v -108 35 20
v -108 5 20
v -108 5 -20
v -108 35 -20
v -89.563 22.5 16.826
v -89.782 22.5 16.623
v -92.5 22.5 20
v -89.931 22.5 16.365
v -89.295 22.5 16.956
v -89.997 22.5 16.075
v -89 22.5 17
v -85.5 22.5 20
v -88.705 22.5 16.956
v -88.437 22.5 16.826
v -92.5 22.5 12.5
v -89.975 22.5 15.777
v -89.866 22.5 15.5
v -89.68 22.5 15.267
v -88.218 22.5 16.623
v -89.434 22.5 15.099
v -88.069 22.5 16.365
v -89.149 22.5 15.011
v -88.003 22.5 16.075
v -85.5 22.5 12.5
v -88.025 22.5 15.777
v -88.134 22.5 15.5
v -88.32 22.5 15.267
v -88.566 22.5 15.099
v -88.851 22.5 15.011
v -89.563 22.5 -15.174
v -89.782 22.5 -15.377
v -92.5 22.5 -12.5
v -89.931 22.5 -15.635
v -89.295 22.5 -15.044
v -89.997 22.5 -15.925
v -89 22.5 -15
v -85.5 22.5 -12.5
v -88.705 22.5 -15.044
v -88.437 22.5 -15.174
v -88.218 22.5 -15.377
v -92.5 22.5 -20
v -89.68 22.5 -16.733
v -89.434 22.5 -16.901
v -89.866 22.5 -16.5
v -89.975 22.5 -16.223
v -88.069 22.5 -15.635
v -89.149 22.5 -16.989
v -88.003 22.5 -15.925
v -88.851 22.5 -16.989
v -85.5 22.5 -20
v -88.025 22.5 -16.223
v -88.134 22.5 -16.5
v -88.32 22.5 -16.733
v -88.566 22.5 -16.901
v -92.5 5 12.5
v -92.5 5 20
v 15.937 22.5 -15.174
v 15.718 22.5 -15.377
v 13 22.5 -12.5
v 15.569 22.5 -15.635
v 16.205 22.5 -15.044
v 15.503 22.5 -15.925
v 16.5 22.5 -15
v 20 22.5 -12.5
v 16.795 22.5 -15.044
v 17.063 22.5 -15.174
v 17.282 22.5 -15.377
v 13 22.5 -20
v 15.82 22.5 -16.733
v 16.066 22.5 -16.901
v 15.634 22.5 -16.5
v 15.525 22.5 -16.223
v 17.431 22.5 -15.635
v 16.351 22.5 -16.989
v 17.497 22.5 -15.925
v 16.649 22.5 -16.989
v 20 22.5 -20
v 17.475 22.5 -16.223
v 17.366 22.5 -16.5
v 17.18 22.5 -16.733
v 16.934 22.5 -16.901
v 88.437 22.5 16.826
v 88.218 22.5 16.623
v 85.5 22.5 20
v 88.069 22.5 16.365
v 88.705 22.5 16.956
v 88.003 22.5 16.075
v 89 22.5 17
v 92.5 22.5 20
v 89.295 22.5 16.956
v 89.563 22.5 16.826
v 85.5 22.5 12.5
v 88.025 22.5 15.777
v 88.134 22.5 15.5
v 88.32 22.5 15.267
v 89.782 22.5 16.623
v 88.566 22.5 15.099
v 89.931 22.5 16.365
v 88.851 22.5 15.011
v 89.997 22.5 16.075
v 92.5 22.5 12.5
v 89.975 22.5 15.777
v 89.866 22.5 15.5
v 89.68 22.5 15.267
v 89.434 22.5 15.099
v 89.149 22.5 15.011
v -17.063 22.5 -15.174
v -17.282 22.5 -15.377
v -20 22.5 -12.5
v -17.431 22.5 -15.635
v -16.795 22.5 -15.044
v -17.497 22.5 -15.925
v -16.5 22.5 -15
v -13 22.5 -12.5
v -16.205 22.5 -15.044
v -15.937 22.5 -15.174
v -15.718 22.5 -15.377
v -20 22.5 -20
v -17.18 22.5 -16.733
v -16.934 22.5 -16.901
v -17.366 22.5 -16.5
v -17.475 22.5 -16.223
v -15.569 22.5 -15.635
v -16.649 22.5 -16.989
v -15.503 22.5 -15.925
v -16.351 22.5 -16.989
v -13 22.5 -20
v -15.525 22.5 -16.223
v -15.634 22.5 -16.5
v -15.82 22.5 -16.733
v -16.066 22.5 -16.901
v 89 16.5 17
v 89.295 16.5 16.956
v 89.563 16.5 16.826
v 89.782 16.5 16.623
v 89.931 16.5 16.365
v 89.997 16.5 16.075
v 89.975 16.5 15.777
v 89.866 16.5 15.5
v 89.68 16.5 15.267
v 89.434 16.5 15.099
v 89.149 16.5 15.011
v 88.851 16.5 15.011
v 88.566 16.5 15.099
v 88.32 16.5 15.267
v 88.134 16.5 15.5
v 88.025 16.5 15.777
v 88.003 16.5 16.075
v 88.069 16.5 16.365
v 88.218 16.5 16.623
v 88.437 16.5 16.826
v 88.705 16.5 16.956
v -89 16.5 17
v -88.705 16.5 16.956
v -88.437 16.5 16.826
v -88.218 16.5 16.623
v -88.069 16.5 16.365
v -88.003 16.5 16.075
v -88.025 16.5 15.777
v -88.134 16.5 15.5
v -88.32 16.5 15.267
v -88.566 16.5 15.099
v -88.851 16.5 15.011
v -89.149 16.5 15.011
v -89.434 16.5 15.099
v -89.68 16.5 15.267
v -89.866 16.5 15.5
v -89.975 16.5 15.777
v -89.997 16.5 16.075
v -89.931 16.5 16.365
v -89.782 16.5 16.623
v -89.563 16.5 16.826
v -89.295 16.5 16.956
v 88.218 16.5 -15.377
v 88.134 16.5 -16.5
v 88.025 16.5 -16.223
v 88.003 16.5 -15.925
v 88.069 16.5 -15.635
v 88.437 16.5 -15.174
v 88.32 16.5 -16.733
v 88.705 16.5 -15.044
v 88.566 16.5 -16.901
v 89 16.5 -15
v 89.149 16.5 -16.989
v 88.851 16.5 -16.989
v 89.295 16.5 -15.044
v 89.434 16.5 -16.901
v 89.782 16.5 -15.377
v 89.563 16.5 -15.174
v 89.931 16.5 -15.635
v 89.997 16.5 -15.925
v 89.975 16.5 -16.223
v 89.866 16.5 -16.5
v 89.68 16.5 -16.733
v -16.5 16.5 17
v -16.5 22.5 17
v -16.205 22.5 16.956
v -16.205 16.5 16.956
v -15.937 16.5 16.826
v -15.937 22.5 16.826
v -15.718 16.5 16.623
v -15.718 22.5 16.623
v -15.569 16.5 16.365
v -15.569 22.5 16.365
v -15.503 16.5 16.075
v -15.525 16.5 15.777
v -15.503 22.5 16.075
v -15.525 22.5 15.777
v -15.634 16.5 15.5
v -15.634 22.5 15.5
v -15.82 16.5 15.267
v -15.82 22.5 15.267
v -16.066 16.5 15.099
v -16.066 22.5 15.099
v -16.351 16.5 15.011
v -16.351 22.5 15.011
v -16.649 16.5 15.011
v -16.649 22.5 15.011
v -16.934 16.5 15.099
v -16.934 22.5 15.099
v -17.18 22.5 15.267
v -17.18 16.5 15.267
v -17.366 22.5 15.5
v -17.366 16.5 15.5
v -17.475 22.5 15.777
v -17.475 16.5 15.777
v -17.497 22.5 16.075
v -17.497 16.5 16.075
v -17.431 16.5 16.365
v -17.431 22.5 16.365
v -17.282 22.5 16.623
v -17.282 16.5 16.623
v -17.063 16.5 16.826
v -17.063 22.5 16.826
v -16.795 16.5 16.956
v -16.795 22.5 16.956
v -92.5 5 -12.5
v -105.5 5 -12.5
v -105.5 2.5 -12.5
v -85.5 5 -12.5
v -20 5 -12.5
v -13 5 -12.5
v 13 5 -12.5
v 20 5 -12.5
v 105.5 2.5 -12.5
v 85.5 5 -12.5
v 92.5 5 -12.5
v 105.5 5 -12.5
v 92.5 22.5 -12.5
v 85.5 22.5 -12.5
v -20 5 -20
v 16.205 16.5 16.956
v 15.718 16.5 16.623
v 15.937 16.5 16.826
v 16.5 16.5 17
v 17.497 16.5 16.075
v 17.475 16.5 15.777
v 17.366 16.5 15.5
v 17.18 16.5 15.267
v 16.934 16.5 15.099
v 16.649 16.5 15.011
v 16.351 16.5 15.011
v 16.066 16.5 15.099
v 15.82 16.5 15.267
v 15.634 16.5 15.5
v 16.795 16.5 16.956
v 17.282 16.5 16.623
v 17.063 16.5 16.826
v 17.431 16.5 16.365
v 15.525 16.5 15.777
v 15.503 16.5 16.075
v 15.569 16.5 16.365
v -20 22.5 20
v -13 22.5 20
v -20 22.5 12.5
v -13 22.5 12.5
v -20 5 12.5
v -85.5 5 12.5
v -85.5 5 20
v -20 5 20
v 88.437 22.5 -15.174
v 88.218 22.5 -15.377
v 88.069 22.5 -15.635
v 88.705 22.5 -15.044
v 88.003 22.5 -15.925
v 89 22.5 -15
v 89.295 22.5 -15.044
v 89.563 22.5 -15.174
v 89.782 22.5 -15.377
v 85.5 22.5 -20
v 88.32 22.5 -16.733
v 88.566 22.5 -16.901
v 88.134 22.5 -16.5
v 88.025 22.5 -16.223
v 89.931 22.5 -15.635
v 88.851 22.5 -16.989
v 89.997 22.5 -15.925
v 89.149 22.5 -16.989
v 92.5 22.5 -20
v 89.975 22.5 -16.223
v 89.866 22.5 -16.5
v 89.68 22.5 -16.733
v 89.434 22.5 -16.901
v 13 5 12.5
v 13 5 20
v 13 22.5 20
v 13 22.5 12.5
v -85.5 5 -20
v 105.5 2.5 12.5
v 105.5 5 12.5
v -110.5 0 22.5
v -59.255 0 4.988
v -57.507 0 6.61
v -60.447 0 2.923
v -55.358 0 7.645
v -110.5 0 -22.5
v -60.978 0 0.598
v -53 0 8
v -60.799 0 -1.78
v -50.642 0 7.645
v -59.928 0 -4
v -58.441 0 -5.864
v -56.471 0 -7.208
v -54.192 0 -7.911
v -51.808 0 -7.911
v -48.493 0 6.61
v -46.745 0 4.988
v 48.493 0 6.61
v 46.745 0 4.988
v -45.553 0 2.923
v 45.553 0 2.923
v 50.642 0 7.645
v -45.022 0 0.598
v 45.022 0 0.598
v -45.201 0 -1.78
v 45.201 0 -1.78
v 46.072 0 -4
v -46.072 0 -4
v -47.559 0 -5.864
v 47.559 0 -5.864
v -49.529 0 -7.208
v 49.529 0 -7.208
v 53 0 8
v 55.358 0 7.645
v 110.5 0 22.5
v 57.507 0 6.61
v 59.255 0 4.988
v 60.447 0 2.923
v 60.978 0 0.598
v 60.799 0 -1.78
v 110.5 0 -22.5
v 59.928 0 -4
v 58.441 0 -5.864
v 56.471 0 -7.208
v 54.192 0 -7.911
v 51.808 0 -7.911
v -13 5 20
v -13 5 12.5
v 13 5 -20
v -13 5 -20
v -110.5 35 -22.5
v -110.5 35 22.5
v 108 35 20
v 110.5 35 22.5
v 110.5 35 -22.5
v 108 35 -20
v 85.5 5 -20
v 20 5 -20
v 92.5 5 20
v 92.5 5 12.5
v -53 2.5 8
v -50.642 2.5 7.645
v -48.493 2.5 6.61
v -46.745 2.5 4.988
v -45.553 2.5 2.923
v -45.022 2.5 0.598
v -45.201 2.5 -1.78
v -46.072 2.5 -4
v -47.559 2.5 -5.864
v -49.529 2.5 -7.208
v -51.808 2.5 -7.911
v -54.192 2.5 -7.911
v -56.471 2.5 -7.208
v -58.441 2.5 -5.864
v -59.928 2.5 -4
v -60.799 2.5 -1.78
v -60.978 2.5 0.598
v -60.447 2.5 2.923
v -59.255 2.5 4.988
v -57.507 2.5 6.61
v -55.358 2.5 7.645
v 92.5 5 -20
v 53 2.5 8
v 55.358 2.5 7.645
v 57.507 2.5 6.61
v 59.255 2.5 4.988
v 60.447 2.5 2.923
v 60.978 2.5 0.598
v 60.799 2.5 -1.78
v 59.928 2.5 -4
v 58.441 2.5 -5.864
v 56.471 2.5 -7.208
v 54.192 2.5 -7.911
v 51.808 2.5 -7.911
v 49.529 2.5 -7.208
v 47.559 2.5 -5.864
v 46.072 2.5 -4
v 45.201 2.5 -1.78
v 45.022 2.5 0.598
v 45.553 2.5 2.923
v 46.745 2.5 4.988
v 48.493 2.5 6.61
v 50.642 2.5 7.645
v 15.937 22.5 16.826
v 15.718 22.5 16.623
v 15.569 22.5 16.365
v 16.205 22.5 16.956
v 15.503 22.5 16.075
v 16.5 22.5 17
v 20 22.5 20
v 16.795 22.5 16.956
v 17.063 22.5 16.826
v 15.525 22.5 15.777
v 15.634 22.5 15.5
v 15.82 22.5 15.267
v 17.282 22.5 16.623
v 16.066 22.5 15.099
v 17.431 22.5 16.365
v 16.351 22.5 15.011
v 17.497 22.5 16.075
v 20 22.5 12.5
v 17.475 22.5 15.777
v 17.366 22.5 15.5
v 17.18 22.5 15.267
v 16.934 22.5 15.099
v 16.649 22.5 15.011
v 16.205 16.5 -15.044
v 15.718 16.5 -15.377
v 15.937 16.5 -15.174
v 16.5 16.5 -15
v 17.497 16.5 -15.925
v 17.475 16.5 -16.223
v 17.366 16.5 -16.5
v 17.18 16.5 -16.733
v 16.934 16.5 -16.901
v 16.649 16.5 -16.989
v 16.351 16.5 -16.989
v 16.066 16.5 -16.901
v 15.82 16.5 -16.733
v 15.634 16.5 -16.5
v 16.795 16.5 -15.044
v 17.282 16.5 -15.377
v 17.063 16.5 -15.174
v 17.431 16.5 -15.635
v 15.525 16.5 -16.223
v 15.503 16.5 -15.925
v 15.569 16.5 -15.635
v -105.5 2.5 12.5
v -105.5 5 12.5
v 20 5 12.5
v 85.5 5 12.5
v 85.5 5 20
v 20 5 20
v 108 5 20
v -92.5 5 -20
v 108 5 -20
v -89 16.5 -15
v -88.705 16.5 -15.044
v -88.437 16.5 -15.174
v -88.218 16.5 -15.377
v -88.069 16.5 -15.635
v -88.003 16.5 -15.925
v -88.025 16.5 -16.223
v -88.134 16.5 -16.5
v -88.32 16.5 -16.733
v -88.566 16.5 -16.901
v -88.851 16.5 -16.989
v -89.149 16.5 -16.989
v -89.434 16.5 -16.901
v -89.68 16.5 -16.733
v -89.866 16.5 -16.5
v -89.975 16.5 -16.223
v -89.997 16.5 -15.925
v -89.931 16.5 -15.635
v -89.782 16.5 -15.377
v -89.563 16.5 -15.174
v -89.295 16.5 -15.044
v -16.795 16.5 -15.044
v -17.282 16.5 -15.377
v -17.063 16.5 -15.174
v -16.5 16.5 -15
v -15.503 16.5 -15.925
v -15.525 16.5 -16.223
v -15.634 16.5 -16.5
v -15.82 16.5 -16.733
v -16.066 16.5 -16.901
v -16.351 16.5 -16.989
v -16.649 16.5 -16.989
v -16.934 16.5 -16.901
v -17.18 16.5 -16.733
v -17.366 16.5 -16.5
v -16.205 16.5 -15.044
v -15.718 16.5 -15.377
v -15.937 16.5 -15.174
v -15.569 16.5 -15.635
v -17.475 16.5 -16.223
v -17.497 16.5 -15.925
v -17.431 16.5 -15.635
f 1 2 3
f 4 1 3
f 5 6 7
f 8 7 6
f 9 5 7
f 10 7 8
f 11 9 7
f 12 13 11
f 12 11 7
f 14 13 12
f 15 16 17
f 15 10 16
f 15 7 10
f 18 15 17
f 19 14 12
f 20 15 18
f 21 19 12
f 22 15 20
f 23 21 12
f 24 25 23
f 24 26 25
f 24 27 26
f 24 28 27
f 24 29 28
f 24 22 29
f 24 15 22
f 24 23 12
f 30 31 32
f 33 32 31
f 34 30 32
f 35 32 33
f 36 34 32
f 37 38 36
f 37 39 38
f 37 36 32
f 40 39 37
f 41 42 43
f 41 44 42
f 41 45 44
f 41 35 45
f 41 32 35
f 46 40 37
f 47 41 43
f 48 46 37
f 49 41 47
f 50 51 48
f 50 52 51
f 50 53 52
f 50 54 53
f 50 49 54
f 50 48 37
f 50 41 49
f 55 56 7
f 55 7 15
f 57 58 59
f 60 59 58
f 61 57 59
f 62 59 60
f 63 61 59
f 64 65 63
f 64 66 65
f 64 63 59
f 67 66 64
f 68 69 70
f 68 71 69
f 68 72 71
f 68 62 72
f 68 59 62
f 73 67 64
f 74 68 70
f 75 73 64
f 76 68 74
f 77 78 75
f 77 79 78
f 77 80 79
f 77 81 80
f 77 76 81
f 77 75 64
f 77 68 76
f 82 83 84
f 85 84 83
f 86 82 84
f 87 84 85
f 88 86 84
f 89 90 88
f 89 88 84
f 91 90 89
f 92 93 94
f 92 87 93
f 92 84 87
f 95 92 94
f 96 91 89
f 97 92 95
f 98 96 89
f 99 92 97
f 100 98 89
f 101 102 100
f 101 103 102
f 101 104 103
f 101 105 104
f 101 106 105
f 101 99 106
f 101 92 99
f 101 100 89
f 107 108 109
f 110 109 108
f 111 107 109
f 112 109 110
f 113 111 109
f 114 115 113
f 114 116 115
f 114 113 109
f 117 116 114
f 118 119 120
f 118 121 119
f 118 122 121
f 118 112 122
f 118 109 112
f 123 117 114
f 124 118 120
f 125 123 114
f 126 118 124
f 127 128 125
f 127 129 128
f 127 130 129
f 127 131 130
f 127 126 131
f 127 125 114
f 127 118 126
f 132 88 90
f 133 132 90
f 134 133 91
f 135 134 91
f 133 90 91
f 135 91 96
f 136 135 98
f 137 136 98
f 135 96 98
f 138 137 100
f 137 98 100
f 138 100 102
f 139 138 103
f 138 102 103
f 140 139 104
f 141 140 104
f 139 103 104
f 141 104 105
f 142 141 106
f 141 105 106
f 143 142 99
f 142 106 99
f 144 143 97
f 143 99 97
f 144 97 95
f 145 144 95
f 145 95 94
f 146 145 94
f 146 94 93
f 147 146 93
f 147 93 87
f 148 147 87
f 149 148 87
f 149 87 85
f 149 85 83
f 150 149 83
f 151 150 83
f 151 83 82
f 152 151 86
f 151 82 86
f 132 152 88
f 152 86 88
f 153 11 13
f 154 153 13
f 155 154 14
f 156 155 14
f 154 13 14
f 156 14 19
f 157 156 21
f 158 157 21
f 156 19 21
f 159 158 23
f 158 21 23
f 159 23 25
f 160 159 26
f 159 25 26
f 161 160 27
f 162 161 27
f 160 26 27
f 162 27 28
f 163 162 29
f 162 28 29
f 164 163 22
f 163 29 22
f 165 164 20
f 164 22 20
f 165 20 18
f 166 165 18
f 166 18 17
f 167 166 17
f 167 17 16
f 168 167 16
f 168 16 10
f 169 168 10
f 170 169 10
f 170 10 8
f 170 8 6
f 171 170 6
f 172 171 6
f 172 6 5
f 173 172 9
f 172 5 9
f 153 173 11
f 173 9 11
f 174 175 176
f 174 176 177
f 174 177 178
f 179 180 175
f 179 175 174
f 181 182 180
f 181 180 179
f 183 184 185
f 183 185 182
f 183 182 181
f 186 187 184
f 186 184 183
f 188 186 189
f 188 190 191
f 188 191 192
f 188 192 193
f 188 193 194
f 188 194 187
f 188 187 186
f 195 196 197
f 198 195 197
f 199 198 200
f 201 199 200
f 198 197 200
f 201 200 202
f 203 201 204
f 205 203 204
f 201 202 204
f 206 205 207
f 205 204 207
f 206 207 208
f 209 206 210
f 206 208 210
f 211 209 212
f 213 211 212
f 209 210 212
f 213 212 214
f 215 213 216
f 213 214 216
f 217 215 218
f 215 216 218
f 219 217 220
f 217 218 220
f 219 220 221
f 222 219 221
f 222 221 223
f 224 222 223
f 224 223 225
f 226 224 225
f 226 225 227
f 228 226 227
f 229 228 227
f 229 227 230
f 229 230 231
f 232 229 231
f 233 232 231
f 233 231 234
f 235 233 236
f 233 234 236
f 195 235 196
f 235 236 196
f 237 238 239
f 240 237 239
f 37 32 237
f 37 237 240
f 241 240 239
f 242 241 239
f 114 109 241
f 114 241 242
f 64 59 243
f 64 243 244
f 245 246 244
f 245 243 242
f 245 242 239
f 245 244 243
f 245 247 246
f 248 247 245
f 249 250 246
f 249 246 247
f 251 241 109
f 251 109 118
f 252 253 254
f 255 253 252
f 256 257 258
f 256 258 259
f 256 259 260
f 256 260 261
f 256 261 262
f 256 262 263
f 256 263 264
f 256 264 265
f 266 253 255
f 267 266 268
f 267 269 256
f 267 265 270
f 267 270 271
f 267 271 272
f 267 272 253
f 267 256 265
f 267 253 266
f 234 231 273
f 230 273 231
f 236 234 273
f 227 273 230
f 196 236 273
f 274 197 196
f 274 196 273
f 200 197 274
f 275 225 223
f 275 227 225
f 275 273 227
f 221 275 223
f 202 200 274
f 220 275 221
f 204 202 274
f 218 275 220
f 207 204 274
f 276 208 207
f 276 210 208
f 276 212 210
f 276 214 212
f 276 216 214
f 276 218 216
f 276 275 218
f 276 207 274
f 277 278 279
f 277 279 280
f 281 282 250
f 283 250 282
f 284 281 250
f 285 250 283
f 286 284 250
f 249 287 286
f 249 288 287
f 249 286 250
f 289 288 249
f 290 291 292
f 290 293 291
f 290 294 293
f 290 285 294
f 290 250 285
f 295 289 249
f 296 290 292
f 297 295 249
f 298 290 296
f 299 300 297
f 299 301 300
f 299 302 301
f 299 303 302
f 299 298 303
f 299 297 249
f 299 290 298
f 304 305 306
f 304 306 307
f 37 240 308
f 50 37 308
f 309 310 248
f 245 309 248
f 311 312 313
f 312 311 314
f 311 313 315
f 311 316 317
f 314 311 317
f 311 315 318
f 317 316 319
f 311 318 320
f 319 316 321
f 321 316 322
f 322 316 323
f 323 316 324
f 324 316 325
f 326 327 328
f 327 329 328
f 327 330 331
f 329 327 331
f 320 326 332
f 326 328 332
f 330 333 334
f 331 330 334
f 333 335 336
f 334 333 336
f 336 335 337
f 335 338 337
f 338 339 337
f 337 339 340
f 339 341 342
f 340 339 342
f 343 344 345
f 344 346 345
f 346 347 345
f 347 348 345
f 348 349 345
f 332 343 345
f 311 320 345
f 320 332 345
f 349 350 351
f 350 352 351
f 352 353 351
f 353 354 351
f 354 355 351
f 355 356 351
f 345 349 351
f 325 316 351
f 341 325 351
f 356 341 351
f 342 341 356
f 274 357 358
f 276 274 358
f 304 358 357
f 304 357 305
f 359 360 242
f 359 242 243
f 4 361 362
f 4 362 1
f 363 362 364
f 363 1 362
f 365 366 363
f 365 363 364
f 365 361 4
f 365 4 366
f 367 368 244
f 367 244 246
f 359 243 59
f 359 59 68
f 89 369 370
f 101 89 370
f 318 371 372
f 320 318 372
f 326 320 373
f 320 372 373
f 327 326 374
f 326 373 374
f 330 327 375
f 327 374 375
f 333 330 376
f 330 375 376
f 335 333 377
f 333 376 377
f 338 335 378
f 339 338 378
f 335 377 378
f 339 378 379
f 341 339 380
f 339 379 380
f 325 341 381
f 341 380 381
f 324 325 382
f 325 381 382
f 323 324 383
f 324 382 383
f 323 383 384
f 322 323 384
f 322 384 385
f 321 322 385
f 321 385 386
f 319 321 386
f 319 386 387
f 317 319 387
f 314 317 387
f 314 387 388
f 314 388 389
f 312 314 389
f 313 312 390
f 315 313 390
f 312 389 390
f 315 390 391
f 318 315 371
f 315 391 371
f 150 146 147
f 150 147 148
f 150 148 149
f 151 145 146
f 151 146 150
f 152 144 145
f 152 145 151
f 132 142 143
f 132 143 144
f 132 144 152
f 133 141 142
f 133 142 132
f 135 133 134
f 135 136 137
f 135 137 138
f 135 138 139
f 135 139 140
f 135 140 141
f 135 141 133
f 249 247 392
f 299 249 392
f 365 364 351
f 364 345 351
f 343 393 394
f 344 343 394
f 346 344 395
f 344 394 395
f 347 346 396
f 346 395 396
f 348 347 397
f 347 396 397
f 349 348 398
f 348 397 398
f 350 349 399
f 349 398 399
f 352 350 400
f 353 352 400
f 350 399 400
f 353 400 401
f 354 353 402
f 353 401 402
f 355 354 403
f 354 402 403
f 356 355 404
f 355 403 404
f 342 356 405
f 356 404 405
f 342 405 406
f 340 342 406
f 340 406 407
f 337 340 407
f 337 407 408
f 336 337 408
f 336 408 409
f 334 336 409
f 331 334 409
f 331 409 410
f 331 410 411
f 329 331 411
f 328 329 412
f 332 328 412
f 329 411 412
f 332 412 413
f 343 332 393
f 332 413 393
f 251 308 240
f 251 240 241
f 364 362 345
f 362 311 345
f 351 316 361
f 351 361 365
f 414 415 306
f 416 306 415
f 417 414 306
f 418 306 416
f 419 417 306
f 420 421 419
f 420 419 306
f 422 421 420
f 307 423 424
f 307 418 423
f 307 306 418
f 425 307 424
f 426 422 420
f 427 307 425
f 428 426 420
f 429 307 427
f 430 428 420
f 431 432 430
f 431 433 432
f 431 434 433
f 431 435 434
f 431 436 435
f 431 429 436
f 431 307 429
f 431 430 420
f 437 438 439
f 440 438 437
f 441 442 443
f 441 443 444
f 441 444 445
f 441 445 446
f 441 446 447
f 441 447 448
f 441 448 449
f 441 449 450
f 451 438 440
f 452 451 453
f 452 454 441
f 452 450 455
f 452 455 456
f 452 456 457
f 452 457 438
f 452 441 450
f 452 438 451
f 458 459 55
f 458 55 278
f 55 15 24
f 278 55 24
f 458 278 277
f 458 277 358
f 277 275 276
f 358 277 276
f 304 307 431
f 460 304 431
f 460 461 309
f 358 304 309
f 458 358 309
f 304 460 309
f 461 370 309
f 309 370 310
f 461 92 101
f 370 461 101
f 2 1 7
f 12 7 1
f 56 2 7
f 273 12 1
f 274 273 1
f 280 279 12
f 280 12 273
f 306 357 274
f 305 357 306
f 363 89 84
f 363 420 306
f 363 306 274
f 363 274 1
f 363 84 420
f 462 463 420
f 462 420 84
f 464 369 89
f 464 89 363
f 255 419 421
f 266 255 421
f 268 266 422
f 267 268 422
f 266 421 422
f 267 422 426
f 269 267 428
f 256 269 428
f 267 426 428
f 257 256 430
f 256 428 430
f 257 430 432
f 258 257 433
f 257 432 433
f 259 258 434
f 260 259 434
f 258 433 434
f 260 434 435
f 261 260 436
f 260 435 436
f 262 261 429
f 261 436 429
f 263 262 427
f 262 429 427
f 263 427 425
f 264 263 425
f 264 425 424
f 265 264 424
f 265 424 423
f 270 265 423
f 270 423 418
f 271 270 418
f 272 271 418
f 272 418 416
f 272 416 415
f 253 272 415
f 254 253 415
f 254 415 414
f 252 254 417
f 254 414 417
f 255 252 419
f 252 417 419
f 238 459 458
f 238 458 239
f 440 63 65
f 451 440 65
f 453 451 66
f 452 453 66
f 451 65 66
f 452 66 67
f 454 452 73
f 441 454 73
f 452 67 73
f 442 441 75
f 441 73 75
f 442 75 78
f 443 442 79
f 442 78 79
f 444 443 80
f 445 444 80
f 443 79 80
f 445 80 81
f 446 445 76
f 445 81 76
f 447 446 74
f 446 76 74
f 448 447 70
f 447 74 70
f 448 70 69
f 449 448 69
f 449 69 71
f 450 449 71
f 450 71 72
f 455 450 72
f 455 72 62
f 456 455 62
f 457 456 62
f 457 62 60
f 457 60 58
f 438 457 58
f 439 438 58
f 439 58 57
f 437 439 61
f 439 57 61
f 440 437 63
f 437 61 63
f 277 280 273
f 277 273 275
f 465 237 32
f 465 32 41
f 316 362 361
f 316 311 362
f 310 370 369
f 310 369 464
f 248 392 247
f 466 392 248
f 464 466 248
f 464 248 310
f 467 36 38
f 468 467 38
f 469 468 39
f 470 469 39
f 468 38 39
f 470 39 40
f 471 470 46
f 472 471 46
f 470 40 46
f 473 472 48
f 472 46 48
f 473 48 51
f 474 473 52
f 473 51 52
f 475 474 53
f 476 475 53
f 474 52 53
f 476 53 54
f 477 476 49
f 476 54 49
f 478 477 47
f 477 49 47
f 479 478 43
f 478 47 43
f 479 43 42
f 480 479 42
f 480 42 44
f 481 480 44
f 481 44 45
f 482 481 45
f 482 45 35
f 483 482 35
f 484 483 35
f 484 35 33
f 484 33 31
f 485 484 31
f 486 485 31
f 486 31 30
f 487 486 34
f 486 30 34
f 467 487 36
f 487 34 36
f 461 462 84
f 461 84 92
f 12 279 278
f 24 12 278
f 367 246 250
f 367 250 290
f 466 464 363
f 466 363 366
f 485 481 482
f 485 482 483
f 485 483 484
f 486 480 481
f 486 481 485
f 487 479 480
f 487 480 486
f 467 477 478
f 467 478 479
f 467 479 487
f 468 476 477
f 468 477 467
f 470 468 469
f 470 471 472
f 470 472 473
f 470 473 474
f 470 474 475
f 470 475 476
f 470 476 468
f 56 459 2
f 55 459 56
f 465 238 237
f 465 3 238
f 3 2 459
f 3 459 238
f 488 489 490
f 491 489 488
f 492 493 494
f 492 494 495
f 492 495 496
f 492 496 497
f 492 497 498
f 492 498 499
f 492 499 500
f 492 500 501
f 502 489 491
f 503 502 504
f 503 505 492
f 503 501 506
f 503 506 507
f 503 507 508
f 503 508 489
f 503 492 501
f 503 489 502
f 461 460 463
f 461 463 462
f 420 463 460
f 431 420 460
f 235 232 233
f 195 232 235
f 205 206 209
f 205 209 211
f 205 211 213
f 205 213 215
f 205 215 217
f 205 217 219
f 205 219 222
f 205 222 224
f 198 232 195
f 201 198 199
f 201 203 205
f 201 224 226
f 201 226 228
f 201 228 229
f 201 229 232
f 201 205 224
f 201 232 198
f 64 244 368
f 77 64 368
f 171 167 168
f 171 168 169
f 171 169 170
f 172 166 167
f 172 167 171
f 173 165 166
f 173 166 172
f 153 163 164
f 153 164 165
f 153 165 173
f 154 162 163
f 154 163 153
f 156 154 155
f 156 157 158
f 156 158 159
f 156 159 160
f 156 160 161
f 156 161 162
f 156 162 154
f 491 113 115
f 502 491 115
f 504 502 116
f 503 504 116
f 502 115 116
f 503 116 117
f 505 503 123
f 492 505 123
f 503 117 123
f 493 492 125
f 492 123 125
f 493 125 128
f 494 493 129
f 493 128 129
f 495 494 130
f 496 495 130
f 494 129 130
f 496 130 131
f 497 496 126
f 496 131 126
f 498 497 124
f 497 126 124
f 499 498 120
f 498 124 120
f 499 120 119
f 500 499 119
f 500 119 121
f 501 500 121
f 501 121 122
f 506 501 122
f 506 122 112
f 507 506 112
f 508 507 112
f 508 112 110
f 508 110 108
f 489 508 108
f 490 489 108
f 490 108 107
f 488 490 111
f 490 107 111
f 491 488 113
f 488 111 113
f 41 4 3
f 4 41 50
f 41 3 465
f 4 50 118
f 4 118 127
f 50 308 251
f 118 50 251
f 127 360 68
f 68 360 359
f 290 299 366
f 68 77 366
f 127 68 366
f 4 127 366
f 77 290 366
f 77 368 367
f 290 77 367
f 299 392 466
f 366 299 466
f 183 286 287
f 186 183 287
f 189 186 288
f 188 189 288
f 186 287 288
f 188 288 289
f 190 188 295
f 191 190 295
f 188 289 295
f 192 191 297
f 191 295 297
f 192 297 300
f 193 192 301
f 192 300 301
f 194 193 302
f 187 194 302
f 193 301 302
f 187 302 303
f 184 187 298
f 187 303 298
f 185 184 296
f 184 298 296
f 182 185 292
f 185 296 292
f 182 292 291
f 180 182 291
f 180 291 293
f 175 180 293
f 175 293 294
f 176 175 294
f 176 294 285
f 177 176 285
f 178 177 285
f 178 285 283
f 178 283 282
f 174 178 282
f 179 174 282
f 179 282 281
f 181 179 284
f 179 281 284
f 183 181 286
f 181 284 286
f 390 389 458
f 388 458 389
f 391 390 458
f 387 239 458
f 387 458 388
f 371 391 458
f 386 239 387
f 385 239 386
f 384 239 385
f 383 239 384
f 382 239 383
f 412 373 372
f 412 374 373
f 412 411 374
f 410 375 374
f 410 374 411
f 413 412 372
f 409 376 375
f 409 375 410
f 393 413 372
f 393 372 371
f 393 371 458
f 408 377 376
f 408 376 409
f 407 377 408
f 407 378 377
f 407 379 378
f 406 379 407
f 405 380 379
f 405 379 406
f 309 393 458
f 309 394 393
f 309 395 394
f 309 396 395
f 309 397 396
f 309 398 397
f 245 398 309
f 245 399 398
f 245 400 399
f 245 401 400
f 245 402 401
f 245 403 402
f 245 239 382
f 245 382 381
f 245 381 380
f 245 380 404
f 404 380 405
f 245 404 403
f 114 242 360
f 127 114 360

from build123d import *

# Parameters (mm, degrees)
SKETCH1_W           = 221
SKETCH1_H           = 45
BOSS_EXTRUDE1_DEPTH = 5
SKETCH2_W           = 211
SKETCH2_H           = 25
CUT_EXTRUDE1_DEPTH  = 2.5
SKETCH3_R           = 8
CUT_EXTRUDE2_DEPTH  = 2.5
SKETCH6_W           = 221
SKETCH6_H           = 45
SKETCH6_W_2         = 216
SKETCH6_H_2         = 40
BOSS_EXTRUDE3_DEPTH = 30
SKETCH7_W           = 7
SKETCH7_H           = 7.5
BOSS_EXTRUDE4_DEPTH = 17.5
SKETCH9_R           = 1
CUT_EXTRUDE3_DEPTH  = 6


with BuildPart() as part:
    # Sketch1 → Boss-Extrude1 (new body)
    with BuildSketch(Plane(origin=(0, 0, 0), x_dir=(1, 0, 0), z_dir=(0, 1, 0))):
        Rectangle(SKETCH1_W, SKETCH1_H)
    extrude(amount=BOSS_EXTRUDE1_DEPTH)

    # Sketch2 → Cut-Extrude1 (cut)
    with BuildSketch(Plane(origin=(0, 5, 0), x_dir=(1, 0, 0), z_dir=(0, 1, 0))):
        Rectangle(SKETCH2_W, SKETCH2_H)
    extrude(amount=-CUT_EXTRUDE1_DEPTH, mode=Mode.SUBTRACT)

    # Sketch3 → Cut-Extrude2 (cut)
    with BuildSketch(Plane(origin=(0, 2.5, 0), x_dir=(1, 0, 0), z_dir=(0, 1, 0))):
        with Locations(Location((-53, 0, 0), (0, 0, 270))):
            Circle(SKETCH3_R)
        with Locations(Location((53, 0, 0), (0, 0, 270))):
            Circle(SKETCH3_R)
    extrude(amount=-CUT_EXTRUDE2_DEPTH, mode=Mode.SUBTRACT)

    # Sketch6 → Boss-Extrude3 (add)
    with BuildSketch(Plane(origin=(0, 5, 0), x_dir=(1, 0, 0), z_dir=(0, 1, 0))):
        Rectangle(SKETCH6_W, SKETCH6_H)
        Rectangle(SKETCH6_W_2, SKETCH6_H_2, mode=Mode.SUBTRACT)
    extrude(amount=BOSS_EXTRUDE3_DEPTH)

    # Sketch7 → Boss-Extrude4 (add)
    with BuildSketch(Plane(origin=(0, 5, 0), x_dir=(1, 0, 0), z_dir=(0, 1, 0))):
        with Locations((-89, 16.25)):
            Rectangle(SKETCH7_W, SKETCH7_H)
        with Locations((-89, -16.25)):
            Rectangle(SKETCH7_W, SKETCH7_H)
        with Locations((-16.5, 16.25)):
            Rectangle(SKETCH7_W, SKETCH7_H)
        with Locations((-16.5, -16.25)):
            Rectangle(SKETCH7_W, SKETCH7_H)
        with Locations((16.5, 16.25)):
            Rectangle(SKETCH7_W, SKETCH7_H)
        with Locations((16.5, -16.25)):
            Rectangle(SKETCH7_W, SKETCH7_H)
        with Locations((89, 16.25)):
            Rectangle(SKETCH7_W, SKETCH7_H)
        with Locations((89, -16.25)):
            Rectangle(SKETCH7_W, SKETCH7_H)
    extrude(amount=BOSS_EXTRUDE4_DEPTH)

    # Sketch9 → Cut-Extrude3 (cut)
    with BuildSketch(Plane(origin=(0, 22.5, 0), x_dir=(1, 0, 0), z_dir=(0, 1, 0))):
        with Locations(Location((-89, 16, 0), (0, 0, 270))):
            Circle(SKETCH9_R)
        with Locations(Location((-89, -16, 0), (0, 0, 270))):
            Circle(SKETCH9_R)
        with Locations(Location((-16.5, 16, 0), (0, 0, 270))):
            Circle(SKETCH9_R)
        with Locations(Location((-16.5, -16, 0), (0, 0, 270))):
            Circle(SKETCH9_R)
        with Locations(Location((16.5, 16, 0), (0, 0, 270))):
            Circle(SKETCH9_R)
        with Locations(Location((16.5, -16, 0), (0, 0, 270))):
            Circle(SKETCH9_R)
        with Locations(Location((89, 16, 0), (0, 0, 270))):
            Circle(SKETCH9_R)
        with Locations(Location((89, -16, 0), (0, 0, 270))):
            Circle(SKETCH9_R)
    extrude(amount=-CUT_EXTRUDE3_DEPTH, mode=Mode.SUBTRACT)


solid = part.part
